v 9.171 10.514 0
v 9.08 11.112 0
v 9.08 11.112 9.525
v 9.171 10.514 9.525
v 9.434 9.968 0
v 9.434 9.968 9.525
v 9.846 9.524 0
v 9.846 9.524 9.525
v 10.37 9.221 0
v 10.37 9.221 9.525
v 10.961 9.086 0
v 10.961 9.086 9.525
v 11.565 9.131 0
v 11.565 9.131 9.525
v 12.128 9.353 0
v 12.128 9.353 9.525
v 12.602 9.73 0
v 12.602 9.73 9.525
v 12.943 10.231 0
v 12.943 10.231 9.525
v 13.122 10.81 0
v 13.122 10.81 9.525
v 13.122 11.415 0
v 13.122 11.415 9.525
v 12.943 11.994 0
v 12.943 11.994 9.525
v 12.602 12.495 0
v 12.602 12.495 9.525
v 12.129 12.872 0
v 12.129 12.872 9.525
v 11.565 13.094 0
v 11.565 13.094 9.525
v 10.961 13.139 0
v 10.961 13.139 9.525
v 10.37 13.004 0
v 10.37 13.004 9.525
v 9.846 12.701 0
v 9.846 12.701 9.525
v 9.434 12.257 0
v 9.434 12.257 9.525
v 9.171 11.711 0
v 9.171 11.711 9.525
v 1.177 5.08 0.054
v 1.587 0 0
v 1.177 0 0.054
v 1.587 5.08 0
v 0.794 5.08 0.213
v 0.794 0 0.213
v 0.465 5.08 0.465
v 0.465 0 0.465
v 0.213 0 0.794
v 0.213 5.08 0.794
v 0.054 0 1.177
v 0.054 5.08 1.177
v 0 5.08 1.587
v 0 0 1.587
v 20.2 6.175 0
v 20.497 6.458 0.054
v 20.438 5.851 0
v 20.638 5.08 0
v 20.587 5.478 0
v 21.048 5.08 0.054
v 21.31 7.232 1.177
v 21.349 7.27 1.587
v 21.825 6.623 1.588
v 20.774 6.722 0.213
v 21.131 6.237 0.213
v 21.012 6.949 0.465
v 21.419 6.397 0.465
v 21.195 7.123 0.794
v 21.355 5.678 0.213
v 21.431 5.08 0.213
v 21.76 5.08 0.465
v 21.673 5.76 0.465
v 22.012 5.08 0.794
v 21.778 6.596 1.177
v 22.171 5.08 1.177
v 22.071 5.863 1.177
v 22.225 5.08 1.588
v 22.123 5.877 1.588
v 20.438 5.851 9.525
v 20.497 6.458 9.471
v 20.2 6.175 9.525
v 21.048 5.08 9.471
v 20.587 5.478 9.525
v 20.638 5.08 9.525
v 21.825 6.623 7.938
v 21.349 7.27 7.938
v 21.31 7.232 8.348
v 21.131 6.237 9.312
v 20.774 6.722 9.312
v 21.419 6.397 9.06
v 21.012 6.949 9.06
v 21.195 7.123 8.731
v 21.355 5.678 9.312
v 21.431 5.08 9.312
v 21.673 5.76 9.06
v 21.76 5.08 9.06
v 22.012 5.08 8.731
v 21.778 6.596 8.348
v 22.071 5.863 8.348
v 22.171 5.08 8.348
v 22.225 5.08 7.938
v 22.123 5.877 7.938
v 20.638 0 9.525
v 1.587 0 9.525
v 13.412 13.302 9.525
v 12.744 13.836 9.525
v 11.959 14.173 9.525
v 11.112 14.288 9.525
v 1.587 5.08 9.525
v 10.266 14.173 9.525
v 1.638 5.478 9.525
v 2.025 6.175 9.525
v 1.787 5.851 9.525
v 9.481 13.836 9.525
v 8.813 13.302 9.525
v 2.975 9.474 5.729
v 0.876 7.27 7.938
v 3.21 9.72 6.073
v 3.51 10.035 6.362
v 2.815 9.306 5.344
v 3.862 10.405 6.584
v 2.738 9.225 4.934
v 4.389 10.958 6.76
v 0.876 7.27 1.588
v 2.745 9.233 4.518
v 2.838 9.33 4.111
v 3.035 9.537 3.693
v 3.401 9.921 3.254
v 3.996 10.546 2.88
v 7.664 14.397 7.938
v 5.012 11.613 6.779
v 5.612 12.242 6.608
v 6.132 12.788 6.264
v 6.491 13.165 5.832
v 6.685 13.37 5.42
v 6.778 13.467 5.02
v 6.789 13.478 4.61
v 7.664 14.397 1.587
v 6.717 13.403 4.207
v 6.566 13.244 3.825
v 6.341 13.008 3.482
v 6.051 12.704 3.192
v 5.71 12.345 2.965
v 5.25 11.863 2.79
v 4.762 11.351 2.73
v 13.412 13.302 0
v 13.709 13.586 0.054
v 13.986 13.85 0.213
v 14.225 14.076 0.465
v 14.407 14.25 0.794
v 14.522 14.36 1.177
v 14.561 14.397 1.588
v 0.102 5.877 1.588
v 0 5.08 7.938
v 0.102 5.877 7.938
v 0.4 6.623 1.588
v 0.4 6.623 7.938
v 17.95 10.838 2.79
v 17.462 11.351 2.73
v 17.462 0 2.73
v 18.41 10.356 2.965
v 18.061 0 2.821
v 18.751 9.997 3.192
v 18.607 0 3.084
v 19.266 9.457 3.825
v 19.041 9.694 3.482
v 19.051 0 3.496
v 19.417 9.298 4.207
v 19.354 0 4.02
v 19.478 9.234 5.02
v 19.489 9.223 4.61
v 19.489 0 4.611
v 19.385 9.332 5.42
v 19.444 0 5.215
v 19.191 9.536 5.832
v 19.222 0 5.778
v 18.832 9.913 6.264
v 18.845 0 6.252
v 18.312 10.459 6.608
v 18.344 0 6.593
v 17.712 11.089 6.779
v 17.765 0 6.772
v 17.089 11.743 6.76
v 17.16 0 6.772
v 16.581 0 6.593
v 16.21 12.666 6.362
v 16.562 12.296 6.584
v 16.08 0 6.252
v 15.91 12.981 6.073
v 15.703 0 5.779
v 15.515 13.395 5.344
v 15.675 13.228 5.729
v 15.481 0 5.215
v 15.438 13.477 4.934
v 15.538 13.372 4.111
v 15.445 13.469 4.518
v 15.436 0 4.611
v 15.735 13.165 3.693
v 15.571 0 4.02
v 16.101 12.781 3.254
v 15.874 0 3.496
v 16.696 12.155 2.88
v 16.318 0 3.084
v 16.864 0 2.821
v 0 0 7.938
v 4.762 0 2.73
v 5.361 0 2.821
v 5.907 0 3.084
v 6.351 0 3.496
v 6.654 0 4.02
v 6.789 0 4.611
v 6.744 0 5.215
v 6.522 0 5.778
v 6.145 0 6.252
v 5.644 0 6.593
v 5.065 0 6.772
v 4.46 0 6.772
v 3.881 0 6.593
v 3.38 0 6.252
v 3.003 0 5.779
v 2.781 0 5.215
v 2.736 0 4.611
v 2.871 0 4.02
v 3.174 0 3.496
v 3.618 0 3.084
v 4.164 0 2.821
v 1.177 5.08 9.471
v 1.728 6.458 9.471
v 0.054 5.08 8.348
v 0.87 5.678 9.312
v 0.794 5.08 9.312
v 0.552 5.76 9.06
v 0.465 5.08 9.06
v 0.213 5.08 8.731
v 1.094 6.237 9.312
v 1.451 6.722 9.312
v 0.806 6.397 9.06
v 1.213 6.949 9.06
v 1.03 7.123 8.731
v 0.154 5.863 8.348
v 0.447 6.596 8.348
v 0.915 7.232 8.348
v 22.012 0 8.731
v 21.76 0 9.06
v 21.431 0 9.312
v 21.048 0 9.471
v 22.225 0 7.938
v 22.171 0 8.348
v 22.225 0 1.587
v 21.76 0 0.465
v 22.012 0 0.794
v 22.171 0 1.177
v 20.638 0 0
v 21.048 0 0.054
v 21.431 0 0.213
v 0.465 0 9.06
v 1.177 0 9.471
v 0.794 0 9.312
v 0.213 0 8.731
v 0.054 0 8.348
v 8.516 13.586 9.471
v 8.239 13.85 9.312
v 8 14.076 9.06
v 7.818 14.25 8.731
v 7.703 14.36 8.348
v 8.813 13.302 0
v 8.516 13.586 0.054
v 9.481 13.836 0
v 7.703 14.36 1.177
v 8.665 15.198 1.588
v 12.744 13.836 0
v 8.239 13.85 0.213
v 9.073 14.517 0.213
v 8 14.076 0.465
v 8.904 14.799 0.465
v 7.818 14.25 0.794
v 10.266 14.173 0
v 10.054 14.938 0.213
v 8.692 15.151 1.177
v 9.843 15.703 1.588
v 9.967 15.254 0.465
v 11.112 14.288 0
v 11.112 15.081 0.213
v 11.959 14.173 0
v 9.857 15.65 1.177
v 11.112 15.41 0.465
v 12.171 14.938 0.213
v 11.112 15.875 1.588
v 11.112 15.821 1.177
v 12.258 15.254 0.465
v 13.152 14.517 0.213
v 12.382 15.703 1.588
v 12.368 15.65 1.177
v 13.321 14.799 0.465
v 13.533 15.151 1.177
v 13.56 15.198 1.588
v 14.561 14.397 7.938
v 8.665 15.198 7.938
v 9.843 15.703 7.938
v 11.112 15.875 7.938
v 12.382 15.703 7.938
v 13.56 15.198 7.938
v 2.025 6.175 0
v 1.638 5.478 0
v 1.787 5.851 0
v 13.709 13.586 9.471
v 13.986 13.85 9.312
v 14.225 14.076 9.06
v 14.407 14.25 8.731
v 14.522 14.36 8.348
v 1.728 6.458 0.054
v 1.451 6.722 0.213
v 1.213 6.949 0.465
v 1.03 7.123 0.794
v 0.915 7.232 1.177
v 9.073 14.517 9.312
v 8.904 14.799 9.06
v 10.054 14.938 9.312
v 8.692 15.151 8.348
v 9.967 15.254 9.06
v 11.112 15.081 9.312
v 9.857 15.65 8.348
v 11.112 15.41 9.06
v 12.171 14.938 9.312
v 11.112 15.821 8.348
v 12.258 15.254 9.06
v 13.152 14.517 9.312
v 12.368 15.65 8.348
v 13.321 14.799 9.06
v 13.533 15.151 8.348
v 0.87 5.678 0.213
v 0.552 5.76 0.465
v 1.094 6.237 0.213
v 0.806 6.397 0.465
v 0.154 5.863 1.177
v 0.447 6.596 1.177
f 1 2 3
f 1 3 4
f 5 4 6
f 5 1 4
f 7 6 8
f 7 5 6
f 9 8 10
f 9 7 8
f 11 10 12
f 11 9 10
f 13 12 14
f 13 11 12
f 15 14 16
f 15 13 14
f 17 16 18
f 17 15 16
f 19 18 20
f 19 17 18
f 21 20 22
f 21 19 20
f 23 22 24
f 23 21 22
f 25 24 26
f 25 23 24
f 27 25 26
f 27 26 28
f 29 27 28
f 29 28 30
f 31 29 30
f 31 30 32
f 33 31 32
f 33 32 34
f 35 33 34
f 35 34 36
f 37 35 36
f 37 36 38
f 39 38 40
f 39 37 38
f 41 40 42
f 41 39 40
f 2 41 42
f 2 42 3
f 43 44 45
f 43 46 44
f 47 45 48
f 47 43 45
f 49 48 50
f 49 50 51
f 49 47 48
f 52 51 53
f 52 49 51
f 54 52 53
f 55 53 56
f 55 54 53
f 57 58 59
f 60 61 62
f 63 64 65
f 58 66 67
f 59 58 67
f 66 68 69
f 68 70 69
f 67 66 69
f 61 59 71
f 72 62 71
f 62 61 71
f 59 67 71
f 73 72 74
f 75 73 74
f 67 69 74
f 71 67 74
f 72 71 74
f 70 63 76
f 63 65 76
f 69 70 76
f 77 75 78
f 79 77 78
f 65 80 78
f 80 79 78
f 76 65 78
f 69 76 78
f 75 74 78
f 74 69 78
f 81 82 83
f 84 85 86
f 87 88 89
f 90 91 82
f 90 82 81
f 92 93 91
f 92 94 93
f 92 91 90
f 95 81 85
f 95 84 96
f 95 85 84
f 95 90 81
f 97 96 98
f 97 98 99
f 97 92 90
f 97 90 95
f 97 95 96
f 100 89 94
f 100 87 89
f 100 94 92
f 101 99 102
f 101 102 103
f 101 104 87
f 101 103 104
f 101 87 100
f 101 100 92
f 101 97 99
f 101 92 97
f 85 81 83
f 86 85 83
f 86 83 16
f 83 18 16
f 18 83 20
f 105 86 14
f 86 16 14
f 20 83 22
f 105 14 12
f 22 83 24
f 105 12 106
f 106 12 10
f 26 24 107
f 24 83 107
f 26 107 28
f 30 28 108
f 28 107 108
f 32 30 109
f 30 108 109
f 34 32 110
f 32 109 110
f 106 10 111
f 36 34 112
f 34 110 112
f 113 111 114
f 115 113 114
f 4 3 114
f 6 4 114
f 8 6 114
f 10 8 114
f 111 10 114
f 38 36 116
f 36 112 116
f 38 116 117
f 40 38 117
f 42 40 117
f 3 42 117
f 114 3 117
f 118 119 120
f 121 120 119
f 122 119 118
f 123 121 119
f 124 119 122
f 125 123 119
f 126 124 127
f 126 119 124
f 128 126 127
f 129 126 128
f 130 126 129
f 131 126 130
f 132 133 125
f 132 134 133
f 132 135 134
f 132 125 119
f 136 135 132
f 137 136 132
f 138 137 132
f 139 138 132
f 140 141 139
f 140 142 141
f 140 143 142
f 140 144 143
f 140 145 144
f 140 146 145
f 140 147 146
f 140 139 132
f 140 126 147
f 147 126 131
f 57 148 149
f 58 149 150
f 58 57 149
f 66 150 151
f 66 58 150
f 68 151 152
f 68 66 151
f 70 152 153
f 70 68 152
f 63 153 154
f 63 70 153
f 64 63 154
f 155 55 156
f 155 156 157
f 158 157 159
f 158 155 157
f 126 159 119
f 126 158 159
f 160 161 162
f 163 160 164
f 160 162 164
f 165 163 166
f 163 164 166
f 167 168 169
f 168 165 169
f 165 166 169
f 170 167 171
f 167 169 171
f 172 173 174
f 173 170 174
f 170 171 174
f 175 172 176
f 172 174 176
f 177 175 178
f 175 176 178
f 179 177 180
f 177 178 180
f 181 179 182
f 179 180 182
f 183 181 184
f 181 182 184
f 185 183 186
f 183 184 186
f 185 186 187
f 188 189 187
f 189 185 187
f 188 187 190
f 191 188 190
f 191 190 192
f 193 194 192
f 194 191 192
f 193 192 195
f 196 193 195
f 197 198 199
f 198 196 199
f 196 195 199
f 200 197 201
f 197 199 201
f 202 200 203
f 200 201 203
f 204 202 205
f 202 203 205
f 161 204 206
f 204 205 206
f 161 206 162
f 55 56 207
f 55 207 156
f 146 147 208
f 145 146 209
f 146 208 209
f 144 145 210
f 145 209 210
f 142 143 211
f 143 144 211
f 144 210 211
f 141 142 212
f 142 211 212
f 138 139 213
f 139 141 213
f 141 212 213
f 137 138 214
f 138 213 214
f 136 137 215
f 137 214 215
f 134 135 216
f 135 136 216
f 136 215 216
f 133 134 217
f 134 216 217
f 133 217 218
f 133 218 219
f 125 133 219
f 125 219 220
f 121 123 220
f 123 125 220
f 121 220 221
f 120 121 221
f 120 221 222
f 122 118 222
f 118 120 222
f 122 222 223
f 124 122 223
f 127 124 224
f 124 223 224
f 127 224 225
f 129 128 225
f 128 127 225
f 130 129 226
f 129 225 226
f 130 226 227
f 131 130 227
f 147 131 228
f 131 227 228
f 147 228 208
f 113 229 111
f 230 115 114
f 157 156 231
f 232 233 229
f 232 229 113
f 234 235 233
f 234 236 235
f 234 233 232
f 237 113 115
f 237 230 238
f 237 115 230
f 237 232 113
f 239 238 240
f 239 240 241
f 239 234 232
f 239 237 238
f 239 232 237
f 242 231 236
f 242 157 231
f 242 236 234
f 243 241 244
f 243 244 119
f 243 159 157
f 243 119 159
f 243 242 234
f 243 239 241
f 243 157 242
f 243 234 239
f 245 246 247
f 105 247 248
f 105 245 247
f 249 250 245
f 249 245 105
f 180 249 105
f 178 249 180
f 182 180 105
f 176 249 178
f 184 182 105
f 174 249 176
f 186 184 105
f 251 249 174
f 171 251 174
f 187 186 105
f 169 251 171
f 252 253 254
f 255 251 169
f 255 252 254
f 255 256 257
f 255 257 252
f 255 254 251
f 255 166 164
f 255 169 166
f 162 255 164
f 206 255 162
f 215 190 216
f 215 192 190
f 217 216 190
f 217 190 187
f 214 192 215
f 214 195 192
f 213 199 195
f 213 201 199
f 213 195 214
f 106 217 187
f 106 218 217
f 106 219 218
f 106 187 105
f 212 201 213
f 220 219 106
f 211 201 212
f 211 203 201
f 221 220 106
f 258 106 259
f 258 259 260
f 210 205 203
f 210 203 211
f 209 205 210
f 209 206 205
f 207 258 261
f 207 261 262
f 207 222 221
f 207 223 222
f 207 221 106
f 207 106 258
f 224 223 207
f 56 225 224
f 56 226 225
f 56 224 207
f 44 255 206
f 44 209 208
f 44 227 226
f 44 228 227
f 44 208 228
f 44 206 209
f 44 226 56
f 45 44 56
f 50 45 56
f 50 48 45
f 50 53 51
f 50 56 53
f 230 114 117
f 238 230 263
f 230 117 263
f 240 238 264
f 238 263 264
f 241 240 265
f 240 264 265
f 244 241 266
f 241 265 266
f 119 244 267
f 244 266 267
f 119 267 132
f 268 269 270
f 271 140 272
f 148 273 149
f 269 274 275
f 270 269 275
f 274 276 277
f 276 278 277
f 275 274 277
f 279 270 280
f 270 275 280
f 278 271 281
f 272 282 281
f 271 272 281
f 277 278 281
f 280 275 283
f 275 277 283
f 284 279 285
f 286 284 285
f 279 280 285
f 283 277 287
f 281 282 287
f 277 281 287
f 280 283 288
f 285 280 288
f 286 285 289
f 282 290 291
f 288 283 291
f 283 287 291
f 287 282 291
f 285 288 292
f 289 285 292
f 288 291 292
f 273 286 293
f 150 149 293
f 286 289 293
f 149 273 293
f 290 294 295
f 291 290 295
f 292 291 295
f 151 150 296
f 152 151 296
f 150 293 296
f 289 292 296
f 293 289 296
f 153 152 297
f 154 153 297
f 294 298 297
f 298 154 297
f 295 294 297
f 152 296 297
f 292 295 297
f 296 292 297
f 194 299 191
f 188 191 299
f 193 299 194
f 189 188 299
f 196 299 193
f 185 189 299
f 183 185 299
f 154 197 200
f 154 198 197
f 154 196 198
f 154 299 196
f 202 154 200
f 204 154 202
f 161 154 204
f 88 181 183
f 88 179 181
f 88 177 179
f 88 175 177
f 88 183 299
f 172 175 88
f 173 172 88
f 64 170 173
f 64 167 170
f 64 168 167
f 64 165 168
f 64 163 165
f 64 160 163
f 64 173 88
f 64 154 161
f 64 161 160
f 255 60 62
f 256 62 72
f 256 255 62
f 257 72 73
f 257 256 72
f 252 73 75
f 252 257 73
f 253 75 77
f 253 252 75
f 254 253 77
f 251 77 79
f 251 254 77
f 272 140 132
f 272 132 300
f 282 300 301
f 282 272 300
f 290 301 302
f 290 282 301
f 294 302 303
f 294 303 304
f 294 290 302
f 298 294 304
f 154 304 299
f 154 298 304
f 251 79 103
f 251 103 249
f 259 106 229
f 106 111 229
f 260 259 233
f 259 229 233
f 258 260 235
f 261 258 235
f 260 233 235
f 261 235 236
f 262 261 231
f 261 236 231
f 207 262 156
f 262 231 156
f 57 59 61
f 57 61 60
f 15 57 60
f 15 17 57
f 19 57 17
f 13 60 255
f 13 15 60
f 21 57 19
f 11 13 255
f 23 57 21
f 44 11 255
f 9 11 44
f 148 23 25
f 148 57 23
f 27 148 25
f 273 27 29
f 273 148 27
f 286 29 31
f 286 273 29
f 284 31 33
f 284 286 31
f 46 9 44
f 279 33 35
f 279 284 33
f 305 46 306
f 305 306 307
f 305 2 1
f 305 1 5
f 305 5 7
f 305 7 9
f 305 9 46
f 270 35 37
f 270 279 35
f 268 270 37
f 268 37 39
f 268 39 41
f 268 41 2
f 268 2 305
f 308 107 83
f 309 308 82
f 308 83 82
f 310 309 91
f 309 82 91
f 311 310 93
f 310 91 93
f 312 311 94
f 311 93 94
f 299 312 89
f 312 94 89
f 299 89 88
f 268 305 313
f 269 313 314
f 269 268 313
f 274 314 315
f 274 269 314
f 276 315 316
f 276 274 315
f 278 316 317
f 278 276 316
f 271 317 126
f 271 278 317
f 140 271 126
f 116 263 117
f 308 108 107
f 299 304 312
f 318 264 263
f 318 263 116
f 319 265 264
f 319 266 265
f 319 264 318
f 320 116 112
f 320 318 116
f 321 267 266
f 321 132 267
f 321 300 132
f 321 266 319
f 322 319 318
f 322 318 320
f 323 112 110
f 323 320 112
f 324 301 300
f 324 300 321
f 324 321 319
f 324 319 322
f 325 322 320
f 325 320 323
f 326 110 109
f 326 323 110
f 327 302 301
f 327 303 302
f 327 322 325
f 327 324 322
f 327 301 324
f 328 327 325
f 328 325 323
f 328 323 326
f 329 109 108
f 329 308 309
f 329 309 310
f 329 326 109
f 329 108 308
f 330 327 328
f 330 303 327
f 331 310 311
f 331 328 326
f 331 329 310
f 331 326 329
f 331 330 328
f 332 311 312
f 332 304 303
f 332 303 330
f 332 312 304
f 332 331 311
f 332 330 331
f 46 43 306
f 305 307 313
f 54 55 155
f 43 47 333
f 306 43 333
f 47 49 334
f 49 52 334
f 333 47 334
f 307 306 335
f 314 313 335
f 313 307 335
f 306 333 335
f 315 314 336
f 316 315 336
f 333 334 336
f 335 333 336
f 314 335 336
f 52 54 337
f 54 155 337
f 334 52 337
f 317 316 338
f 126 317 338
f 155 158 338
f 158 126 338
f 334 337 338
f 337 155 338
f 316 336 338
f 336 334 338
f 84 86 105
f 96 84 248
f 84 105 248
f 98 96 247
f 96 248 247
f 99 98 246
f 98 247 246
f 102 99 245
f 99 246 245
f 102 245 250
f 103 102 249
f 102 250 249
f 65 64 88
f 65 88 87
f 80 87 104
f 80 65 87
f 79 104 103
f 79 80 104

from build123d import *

# Parameters (mm, degrees)
SKETCH1_R           = 2.032
BOSS_EXTRUDE1_DEPTH = 9.525
SKETCH2_R           = 2.032
CUT_EXTRUDE1_DEPTH  = 29.925626614
FILLET1_R           = 1.5875


with BuildPart() as part:
    # Sketch1 → Boss-Extrude1 (new body)
    with BuildSketch(Plane.XY):
        with BuildLine():
            Line((0, 0), (0, 5.08))
            ThreePointArc((0, 5.08), (0.227086506, 6.259165397), (0.875862069, 7.269655172))
            Line((0.875862069, 7.269655172), (7.663793103, 14.396982759))
            ThreePointArc((7.663793103, 14.396982759), (11.1125, 15.875), (14.561206897, 14.396982759))
            Line((14.561206897, 14.396982759), (21.349137931, 7.269655172))
            ThreePointArc((21.349137931, 7.269655172), (21.997913494, 6.259165397), (22.225, 5.08))
            Line((22.225, 5.08), (22.225, 0))
            Line((22.225, 0), (0, 0))
        make_face()
        with Locations(Location((11.1125, 11.1125, 0), (0, 0, 180))):
            Circle(SKETCH1_R, mode=Mode.SUBTRACT)
    extrude(amount=BOSS_EXTRUDE1_DEPTH)

    # Sketch2 → Cut-Extrude1 (cut, through all)
    with BuildSketch(Plane.XZ):
        with Locations(Location((4.7625, 4.7625, 0), (0, 0, 270))):
            Circle(SKETCH2_R)
        with Locations(Location((17.4625, 4.7625, 0), (0, 0, 270))):
            Circle(SKETCH2_R)
    extrude(amount=-CUT_EXTRUDE1_DEPTH, mode=Mode.SUBTRACT)

    # Fillet1
    fillet1_edges = [part.edges().sort_by_distance(p)[0] for p in [
        (17.955172414, 10.833318966, 0),
        (21.997913494, 6.259165397, 0),
        (22.225, 2.54, 0),
        (21.997913494, 6.259165397, 9.525),
        (17.955172414, 10.833318966, 9.525),
        (11.1125, 15.875, 9.525),
        (4.269827586, 10.833318966, 9.525),
        (0.227086506, 6.259165397, 9.525),
        (0, 2.54, 9.525),
        (0, 2.54, 0),
        (22.225, 2.54, 9.525),
        (0.227086506, 6.259165397, 0),
        (4.269827586, 10.833318966, 0),
        (11.1125, 15.875, 0),
    ]]
    fillet(fillet1_edges, radius=FILLET1_R)


solid = part.part
